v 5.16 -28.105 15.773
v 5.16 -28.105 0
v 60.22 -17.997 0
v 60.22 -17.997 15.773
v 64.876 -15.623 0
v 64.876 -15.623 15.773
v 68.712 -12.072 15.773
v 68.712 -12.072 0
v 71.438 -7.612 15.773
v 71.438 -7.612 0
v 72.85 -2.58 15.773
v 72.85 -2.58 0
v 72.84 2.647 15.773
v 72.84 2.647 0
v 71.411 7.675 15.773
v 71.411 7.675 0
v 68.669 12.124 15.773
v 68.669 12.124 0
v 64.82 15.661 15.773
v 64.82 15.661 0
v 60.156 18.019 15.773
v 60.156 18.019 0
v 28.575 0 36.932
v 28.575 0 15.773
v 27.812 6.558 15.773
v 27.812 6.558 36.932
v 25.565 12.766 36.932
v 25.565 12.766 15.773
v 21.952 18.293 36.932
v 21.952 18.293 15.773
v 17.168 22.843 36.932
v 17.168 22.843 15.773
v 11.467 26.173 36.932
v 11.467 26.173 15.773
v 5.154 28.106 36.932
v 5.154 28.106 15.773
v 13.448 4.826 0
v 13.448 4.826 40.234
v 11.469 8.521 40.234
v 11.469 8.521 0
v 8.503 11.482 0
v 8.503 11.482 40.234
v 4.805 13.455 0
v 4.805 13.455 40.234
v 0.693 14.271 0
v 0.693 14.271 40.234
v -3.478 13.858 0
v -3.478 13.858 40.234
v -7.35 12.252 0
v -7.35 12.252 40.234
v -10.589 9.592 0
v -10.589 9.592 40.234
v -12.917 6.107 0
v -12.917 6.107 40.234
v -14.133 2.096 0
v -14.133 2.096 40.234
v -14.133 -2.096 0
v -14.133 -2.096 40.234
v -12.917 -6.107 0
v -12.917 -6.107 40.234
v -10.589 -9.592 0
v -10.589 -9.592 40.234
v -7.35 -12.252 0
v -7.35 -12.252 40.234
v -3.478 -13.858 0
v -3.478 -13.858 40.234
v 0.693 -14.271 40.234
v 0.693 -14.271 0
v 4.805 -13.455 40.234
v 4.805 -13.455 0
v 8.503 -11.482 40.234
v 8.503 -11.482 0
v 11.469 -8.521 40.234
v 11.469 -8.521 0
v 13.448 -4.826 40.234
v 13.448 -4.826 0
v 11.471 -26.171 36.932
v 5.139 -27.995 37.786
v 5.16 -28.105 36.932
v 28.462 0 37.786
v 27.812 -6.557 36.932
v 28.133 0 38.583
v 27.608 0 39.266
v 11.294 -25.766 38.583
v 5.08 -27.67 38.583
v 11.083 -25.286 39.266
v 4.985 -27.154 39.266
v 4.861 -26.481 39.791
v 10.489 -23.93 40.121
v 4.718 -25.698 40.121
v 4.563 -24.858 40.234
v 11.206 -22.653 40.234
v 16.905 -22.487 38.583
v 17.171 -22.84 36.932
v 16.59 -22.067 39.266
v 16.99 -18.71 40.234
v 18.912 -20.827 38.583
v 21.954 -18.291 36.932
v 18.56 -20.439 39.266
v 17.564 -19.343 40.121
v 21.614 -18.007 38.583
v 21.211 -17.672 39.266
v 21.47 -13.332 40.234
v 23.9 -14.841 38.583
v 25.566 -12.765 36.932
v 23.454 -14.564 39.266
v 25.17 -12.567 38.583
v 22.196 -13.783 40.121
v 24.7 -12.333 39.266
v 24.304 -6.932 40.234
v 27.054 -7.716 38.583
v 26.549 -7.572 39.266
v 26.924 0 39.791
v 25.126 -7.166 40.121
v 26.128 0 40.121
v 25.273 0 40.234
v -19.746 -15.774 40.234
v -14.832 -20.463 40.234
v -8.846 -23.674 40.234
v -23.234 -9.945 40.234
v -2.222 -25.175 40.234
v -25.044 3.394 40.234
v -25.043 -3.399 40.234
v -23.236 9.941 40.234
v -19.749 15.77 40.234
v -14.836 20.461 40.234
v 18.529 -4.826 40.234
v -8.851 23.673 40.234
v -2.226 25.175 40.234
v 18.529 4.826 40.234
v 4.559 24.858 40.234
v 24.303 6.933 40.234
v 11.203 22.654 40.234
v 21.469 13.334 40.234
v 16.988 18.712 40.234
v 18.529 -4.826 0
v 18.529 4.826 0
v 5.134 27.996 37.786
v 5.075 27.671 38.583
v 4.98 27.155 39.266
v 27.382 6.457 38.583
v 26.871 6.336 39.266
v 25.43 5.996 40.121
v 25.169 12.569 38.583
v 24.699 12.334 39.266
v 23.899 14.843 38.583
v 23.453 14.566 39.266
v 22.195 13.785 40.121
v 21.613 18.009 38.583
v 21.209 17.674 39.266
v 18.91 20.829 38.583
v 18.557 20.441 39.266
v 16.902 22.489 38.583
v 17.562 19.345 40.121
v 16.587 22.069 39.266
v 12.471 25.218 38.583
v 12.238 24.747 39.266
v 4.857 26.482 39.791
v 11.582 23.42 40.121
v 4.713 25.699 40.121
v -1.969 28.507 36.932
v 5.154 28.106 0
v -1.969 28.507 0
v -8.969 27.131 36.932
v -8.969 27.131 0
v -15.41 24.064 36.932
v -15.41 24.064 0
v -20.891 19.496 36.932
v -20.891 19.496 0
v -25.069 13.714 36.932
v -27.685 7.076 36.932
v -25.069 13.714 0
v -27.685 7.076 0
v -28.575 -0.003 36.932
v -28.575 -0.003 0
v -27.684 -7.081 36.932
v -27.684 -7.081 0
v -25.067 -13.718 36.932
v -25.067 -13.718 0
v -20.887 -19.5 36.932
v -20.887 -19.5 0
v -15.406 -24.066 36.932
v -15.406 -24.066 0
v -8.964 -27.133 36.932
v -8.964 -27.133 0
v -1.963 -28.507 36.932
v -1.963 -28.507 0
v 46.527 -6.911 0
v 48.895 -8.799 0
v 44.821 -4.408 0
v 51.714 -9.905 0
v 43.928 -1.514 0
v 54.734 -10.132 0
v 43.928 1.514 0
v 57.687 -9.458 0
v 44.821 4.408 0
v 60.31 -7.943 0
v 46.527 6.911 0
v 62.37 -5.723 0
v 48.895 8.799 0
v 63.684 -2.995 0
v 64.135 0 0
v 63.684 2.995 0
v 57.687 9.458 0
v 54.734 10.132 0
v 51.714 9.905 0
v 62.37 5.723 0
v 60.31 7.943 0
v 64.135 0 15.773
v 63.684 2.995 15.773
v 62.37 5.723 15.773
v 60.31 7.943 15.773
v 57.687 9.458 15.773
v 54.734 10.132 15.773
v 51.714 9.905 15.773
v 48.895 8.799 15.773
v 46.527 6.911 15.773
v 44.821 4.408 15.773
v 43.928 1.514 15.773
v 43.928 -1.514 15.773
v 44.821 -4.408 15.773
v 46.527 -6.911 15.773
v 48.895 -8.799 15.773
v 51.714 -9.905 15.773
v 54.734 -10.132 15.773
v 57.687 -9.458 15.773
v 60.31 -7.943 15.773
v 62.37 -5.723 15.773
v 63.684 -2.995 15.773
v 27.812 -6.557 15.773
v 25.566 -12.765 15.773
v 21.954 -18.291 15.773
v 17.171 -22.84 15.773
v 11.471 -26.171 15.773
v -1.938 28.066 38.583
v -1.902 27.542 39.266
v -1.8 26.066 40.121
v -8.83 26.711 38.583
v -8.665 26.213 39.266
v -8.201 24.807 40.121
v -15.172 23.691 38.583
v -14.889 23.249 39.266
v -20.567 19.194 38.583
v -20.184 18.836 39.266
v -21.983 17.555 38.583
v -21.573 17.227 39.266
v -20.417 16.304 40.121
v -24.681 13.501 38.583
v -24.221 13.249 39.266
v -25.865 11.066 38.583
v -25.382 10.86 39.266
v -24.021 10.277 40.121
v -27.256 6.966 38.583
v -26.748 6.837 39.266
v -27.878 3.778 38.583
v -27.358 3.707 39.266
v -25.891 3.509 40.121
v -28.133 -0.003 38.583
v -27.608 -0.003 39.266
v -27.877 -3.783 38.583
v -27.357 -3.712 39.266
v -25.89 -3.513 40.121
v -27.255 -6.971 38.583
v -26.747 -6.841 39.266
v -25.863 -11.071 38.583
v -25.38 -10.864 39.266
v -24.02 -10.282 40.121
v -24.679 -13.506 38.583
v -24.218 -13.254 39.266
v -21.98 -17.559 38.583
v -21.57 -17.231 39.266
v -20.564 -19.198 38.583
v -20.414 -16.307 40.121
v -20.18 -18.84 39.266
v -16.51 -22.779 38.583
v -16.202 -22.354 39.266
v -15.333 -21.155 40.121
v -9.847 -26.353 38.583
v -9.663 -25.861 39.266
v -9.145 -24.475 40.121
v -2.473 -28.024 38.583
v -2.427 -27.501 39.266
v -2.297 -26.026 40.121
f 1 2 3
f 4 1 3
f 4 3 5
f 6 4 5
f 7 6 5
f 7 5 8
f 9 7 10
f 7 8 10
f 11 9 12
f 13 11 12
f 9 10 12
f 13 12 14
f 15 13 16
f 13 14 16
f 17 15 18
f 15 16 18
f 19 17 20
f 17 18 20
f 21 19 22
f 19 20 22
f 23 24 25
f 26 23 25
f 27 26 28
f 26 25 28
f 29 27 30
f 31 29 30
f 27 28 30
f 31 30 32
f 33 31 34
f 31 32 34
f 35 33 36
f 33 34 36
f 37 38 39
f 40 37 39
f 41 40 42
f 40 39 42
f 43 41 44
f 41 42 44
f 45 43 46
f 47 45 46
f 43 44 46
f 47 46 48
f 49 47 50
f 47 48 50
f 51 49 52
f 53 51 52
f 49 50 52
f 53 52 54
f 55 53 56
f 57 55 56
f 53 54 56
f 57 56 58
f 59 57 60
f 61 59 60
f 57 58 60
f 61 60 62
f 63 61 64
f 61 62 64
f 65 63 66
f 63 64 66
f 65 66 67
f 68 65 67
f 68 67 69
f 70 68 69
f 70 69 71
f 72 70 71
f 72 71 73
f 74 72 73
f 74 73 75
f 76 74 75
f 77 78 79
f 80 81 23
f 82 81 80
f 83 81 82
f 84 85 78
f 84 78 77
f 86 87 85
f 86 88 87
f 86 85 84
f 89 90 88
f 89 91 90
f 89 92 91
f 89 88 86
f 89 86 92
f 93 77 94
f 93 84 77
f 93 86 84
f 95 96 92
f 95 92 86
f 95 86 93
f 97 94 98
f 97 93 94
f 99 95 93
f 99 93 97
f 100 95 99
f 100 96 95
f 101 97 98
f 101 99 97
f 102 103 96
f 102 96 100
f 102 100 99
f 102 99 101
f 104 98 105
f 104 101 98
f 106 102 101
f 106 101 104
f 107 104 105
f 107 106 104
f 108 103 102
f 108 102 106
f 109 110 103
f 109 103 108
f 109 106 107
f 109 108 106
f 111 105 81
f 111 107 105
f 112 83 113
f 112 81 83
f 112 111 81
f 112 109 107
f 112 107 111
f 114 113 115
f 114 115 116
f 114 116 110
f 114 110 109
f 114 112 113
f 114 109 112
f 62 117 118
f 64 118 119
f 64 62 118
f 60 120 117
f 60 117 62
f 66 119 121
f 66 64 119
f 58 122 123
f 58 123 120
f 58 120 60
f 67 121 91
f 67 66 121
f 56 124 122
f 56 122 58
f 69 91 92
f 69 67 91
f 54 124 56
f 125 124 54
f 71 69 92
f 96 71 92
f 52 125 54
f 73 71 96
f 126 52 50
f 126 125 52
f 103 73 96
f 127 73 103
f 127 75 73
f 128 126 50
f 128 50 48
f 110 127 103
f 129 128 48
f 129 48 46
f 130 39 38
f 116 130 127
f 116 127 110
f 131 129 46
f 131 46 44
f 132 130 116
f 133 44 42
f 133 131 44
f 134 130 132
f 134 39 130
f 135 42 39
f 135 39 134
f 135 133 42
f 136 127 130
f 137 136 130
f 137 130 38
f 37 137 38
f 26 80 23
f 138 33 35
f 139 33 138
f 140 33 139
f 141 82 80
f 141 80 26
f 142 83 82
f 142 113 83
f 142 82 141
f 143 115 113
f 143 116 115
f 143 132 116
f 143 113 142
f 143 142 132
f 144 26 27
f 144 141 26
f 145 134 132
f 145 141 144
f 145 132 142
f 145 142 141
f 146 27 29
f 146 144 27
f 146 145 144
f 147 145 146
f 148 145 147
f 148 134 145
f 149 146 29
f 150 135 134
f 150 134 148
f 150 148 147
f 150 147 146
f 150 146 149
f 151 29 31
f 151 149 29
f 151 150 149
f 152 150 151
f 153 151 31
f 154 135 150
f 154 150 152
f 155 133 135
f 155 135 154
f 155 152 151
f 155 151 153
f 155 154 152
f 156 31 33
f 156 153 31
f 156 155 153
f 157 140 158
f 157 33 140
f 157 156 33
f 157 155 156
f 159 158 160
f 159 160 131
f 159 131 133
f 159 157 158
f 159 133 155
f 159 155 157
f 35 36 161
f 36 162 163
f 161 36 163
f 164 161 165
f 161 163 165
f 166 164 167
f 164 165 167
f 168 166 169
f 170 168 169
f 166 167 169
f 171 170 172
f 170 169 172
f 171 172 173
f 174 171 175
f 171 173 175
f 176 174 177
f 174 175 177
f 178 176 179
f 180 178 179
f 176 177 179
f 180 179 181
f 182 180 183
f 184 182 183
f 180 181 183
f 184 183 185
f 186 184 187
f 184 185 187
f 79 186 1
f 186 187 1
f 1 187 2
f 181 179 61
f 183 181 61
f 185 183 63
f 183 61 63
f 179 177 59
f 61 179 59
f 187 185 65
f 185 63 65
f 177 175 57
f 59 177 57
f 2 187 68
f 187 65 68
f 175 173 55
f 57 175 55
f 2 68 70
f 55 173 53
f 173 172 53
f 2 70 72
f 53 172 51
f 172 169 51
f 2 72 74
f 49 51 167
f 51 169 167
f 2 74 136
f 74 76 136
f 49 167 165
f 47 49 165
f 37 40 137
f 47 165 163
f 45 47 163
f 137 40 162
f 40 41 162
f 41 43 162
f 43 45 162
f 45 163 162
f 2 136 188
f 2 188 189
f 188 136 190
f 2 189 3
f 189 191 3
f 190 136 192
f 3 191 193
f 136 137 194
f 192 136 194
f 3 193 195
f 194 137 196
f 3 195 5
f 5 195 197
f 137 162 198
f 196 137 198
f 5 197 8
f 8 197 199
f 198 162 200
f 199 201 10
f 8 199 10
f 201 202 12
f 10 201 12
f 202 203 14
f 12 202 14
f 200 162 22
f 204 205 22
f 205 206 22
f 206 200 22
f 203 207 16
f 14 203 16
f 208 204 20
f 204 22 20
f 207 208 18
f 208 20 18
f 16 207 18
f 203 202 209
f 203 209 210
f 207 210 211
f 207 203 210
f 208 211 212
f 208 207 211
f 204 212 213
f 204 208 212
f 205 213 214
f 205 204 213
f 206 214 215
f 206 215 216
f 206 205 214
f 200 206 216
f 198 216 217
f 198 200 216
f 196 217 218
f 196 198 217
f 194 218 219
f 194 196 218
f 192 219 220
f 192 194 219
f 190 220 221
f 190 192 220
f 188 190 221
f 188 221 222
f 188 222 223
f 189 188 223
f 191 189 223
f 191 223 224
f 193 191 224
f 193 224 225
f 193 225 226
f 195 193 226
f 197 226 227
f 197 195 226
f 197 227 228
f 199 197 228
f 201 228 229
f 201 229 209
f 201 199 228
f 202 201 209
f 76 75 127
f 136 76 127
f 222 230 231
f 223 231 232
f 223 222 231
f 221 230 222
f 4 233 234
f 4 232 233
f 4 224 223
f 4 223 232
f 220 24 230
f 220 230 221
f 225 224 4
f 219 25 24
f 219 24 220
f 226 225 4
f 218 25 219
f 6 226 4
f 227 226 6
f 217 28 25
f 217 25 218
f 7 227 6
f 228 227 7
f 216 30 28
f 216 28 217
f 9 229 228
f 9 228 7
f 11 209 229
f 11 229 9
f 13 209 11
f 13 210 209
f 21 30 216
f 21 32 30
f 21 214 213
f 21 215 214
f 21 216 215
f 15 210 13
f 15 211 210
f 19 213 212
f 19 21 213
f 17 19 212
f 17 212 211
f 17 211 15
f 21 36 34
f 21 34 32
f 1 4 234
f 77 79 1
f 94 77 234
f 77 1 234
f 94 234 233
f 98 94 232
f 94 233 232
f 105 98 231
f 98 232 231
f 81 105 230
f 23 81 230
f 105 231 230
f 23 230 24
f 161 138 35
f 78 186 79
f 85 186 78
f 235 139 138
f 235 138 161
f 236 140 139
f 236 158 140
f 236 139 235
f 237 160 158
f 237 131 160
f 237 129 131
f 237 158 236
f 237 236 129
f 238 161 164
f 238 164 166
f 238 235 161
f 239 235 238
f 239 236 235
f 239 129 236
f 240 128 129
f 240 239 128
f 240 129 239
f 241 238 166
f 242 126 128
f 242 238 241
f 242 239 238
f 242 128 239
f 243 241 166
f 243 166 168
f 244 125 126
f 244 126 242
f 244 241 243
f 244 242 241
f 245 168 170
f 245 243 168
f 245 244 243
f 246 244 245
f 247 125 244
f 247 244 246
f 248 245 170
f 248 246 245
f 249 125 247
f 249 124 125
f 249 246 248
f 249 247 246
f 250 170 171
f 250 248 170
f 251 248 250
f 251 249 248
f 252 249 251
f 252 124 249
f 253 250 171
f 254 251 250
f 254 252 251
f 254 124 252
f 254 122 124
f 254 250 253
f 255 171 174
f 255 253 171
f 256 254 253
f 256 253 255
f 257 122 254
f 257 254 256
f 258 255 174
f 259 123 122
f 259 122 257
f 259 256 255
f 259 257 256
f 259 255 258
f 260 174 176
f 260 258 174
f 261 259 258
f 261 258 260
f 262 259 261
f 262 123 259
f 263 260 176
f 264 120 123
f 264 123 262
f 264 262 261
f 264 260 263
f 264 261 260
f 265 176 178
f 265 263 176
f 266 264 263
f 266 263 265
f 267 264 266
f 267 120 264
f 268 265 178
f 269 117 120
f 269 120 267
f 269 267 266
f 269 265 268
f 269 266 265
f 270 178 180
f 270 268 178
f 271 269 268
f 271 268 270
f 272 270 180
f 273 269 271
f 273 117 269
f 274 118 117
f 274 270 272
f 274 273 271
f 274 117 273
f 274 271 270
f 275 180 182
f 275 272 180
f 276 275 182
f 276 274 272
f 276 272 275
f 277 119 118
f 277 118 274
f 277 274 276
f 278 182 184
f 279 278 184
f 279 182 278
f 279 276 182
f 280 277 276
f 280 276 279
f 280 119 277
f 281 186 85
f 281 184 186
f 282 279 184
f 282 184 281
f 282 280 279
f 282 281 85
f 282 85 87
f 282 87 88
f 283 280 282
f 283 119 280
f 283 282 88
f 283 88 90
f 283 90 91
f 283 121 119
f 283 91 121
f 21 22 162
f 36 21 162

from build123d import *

# Parameters (mm, degrees)
F0_R     = 10.16
F1_DEPTH = 15.7734
F3_DEPTH = 24.4602
F5_DEPTH = 40.2346
F6_R     = 3.302


with BuildPart() as f1:
    # F0 (on Top) → F1 (new body)
    with BuildSketch(Plane.XY):
        with BuildLine():
            Line((60.155679, 18.019481), (5.154464, 28.106265))
            ThreePointArc((5.154464, 28.106265), (-28.575, -0.002611), (5.159601, -28.105322))
            Line((5.159601, -28.105322), (60.22005, -17.997273))
            ThreePointArc((60.22005, -17.997273), (73.02497, 0.034047), (60.155679, 18.019481))
        make_face()
        with Locations((53.975, 0)):
            Circle(F0_R, mode=Mode.SUBTRACT)
    extrude(amount=F1_DEPTH)

    # F2 (on face) → F3 (join)
    with BuildSketch(Plane.XY.offset(15.7734)):
        with BuildLine():
            ThreePointArc((5.159601, -28.105322), (21.954114, -18.29064), (28.575, 0))
            ThreePointArc((28.575, 0), (21.952442, 18.292646), (5.154464, 28.106265))
            ThreePointArc((5.154464, 28.106265), (-28.575, -0.002611), (5.159601, -28.105322))
        make_face()
    extrude(amount=F3_DEPTH)

    # F4 (on face) → F5 (cut, through all)
    with BuildSketch(Plane.XY.offset(40.2336)):
        with BuildLine():
            Line((18.5293, 4.826), (13.447765, 4.826))
            ThreePointArc((13.447765, 4.826), (-14.2875, 0), (13.447765, -4.826))
            Line((13.447765, -4.826), (18.5293, -4.826))
            Line((18.5293, -4.826), (18.5293, 4.826))
        make_face()
    extrude(amount=-F5_DEPTH, mode=Mode.SUBTRACT)

    # F6
    f6_edges = [f1.edges().sort_by_distance(p)[0] for p in [
        (-5.159601, 28.105322, 40.2336),
    ]]
    fillet(f6_edges, radius=F6_R)


solid = f1.part
